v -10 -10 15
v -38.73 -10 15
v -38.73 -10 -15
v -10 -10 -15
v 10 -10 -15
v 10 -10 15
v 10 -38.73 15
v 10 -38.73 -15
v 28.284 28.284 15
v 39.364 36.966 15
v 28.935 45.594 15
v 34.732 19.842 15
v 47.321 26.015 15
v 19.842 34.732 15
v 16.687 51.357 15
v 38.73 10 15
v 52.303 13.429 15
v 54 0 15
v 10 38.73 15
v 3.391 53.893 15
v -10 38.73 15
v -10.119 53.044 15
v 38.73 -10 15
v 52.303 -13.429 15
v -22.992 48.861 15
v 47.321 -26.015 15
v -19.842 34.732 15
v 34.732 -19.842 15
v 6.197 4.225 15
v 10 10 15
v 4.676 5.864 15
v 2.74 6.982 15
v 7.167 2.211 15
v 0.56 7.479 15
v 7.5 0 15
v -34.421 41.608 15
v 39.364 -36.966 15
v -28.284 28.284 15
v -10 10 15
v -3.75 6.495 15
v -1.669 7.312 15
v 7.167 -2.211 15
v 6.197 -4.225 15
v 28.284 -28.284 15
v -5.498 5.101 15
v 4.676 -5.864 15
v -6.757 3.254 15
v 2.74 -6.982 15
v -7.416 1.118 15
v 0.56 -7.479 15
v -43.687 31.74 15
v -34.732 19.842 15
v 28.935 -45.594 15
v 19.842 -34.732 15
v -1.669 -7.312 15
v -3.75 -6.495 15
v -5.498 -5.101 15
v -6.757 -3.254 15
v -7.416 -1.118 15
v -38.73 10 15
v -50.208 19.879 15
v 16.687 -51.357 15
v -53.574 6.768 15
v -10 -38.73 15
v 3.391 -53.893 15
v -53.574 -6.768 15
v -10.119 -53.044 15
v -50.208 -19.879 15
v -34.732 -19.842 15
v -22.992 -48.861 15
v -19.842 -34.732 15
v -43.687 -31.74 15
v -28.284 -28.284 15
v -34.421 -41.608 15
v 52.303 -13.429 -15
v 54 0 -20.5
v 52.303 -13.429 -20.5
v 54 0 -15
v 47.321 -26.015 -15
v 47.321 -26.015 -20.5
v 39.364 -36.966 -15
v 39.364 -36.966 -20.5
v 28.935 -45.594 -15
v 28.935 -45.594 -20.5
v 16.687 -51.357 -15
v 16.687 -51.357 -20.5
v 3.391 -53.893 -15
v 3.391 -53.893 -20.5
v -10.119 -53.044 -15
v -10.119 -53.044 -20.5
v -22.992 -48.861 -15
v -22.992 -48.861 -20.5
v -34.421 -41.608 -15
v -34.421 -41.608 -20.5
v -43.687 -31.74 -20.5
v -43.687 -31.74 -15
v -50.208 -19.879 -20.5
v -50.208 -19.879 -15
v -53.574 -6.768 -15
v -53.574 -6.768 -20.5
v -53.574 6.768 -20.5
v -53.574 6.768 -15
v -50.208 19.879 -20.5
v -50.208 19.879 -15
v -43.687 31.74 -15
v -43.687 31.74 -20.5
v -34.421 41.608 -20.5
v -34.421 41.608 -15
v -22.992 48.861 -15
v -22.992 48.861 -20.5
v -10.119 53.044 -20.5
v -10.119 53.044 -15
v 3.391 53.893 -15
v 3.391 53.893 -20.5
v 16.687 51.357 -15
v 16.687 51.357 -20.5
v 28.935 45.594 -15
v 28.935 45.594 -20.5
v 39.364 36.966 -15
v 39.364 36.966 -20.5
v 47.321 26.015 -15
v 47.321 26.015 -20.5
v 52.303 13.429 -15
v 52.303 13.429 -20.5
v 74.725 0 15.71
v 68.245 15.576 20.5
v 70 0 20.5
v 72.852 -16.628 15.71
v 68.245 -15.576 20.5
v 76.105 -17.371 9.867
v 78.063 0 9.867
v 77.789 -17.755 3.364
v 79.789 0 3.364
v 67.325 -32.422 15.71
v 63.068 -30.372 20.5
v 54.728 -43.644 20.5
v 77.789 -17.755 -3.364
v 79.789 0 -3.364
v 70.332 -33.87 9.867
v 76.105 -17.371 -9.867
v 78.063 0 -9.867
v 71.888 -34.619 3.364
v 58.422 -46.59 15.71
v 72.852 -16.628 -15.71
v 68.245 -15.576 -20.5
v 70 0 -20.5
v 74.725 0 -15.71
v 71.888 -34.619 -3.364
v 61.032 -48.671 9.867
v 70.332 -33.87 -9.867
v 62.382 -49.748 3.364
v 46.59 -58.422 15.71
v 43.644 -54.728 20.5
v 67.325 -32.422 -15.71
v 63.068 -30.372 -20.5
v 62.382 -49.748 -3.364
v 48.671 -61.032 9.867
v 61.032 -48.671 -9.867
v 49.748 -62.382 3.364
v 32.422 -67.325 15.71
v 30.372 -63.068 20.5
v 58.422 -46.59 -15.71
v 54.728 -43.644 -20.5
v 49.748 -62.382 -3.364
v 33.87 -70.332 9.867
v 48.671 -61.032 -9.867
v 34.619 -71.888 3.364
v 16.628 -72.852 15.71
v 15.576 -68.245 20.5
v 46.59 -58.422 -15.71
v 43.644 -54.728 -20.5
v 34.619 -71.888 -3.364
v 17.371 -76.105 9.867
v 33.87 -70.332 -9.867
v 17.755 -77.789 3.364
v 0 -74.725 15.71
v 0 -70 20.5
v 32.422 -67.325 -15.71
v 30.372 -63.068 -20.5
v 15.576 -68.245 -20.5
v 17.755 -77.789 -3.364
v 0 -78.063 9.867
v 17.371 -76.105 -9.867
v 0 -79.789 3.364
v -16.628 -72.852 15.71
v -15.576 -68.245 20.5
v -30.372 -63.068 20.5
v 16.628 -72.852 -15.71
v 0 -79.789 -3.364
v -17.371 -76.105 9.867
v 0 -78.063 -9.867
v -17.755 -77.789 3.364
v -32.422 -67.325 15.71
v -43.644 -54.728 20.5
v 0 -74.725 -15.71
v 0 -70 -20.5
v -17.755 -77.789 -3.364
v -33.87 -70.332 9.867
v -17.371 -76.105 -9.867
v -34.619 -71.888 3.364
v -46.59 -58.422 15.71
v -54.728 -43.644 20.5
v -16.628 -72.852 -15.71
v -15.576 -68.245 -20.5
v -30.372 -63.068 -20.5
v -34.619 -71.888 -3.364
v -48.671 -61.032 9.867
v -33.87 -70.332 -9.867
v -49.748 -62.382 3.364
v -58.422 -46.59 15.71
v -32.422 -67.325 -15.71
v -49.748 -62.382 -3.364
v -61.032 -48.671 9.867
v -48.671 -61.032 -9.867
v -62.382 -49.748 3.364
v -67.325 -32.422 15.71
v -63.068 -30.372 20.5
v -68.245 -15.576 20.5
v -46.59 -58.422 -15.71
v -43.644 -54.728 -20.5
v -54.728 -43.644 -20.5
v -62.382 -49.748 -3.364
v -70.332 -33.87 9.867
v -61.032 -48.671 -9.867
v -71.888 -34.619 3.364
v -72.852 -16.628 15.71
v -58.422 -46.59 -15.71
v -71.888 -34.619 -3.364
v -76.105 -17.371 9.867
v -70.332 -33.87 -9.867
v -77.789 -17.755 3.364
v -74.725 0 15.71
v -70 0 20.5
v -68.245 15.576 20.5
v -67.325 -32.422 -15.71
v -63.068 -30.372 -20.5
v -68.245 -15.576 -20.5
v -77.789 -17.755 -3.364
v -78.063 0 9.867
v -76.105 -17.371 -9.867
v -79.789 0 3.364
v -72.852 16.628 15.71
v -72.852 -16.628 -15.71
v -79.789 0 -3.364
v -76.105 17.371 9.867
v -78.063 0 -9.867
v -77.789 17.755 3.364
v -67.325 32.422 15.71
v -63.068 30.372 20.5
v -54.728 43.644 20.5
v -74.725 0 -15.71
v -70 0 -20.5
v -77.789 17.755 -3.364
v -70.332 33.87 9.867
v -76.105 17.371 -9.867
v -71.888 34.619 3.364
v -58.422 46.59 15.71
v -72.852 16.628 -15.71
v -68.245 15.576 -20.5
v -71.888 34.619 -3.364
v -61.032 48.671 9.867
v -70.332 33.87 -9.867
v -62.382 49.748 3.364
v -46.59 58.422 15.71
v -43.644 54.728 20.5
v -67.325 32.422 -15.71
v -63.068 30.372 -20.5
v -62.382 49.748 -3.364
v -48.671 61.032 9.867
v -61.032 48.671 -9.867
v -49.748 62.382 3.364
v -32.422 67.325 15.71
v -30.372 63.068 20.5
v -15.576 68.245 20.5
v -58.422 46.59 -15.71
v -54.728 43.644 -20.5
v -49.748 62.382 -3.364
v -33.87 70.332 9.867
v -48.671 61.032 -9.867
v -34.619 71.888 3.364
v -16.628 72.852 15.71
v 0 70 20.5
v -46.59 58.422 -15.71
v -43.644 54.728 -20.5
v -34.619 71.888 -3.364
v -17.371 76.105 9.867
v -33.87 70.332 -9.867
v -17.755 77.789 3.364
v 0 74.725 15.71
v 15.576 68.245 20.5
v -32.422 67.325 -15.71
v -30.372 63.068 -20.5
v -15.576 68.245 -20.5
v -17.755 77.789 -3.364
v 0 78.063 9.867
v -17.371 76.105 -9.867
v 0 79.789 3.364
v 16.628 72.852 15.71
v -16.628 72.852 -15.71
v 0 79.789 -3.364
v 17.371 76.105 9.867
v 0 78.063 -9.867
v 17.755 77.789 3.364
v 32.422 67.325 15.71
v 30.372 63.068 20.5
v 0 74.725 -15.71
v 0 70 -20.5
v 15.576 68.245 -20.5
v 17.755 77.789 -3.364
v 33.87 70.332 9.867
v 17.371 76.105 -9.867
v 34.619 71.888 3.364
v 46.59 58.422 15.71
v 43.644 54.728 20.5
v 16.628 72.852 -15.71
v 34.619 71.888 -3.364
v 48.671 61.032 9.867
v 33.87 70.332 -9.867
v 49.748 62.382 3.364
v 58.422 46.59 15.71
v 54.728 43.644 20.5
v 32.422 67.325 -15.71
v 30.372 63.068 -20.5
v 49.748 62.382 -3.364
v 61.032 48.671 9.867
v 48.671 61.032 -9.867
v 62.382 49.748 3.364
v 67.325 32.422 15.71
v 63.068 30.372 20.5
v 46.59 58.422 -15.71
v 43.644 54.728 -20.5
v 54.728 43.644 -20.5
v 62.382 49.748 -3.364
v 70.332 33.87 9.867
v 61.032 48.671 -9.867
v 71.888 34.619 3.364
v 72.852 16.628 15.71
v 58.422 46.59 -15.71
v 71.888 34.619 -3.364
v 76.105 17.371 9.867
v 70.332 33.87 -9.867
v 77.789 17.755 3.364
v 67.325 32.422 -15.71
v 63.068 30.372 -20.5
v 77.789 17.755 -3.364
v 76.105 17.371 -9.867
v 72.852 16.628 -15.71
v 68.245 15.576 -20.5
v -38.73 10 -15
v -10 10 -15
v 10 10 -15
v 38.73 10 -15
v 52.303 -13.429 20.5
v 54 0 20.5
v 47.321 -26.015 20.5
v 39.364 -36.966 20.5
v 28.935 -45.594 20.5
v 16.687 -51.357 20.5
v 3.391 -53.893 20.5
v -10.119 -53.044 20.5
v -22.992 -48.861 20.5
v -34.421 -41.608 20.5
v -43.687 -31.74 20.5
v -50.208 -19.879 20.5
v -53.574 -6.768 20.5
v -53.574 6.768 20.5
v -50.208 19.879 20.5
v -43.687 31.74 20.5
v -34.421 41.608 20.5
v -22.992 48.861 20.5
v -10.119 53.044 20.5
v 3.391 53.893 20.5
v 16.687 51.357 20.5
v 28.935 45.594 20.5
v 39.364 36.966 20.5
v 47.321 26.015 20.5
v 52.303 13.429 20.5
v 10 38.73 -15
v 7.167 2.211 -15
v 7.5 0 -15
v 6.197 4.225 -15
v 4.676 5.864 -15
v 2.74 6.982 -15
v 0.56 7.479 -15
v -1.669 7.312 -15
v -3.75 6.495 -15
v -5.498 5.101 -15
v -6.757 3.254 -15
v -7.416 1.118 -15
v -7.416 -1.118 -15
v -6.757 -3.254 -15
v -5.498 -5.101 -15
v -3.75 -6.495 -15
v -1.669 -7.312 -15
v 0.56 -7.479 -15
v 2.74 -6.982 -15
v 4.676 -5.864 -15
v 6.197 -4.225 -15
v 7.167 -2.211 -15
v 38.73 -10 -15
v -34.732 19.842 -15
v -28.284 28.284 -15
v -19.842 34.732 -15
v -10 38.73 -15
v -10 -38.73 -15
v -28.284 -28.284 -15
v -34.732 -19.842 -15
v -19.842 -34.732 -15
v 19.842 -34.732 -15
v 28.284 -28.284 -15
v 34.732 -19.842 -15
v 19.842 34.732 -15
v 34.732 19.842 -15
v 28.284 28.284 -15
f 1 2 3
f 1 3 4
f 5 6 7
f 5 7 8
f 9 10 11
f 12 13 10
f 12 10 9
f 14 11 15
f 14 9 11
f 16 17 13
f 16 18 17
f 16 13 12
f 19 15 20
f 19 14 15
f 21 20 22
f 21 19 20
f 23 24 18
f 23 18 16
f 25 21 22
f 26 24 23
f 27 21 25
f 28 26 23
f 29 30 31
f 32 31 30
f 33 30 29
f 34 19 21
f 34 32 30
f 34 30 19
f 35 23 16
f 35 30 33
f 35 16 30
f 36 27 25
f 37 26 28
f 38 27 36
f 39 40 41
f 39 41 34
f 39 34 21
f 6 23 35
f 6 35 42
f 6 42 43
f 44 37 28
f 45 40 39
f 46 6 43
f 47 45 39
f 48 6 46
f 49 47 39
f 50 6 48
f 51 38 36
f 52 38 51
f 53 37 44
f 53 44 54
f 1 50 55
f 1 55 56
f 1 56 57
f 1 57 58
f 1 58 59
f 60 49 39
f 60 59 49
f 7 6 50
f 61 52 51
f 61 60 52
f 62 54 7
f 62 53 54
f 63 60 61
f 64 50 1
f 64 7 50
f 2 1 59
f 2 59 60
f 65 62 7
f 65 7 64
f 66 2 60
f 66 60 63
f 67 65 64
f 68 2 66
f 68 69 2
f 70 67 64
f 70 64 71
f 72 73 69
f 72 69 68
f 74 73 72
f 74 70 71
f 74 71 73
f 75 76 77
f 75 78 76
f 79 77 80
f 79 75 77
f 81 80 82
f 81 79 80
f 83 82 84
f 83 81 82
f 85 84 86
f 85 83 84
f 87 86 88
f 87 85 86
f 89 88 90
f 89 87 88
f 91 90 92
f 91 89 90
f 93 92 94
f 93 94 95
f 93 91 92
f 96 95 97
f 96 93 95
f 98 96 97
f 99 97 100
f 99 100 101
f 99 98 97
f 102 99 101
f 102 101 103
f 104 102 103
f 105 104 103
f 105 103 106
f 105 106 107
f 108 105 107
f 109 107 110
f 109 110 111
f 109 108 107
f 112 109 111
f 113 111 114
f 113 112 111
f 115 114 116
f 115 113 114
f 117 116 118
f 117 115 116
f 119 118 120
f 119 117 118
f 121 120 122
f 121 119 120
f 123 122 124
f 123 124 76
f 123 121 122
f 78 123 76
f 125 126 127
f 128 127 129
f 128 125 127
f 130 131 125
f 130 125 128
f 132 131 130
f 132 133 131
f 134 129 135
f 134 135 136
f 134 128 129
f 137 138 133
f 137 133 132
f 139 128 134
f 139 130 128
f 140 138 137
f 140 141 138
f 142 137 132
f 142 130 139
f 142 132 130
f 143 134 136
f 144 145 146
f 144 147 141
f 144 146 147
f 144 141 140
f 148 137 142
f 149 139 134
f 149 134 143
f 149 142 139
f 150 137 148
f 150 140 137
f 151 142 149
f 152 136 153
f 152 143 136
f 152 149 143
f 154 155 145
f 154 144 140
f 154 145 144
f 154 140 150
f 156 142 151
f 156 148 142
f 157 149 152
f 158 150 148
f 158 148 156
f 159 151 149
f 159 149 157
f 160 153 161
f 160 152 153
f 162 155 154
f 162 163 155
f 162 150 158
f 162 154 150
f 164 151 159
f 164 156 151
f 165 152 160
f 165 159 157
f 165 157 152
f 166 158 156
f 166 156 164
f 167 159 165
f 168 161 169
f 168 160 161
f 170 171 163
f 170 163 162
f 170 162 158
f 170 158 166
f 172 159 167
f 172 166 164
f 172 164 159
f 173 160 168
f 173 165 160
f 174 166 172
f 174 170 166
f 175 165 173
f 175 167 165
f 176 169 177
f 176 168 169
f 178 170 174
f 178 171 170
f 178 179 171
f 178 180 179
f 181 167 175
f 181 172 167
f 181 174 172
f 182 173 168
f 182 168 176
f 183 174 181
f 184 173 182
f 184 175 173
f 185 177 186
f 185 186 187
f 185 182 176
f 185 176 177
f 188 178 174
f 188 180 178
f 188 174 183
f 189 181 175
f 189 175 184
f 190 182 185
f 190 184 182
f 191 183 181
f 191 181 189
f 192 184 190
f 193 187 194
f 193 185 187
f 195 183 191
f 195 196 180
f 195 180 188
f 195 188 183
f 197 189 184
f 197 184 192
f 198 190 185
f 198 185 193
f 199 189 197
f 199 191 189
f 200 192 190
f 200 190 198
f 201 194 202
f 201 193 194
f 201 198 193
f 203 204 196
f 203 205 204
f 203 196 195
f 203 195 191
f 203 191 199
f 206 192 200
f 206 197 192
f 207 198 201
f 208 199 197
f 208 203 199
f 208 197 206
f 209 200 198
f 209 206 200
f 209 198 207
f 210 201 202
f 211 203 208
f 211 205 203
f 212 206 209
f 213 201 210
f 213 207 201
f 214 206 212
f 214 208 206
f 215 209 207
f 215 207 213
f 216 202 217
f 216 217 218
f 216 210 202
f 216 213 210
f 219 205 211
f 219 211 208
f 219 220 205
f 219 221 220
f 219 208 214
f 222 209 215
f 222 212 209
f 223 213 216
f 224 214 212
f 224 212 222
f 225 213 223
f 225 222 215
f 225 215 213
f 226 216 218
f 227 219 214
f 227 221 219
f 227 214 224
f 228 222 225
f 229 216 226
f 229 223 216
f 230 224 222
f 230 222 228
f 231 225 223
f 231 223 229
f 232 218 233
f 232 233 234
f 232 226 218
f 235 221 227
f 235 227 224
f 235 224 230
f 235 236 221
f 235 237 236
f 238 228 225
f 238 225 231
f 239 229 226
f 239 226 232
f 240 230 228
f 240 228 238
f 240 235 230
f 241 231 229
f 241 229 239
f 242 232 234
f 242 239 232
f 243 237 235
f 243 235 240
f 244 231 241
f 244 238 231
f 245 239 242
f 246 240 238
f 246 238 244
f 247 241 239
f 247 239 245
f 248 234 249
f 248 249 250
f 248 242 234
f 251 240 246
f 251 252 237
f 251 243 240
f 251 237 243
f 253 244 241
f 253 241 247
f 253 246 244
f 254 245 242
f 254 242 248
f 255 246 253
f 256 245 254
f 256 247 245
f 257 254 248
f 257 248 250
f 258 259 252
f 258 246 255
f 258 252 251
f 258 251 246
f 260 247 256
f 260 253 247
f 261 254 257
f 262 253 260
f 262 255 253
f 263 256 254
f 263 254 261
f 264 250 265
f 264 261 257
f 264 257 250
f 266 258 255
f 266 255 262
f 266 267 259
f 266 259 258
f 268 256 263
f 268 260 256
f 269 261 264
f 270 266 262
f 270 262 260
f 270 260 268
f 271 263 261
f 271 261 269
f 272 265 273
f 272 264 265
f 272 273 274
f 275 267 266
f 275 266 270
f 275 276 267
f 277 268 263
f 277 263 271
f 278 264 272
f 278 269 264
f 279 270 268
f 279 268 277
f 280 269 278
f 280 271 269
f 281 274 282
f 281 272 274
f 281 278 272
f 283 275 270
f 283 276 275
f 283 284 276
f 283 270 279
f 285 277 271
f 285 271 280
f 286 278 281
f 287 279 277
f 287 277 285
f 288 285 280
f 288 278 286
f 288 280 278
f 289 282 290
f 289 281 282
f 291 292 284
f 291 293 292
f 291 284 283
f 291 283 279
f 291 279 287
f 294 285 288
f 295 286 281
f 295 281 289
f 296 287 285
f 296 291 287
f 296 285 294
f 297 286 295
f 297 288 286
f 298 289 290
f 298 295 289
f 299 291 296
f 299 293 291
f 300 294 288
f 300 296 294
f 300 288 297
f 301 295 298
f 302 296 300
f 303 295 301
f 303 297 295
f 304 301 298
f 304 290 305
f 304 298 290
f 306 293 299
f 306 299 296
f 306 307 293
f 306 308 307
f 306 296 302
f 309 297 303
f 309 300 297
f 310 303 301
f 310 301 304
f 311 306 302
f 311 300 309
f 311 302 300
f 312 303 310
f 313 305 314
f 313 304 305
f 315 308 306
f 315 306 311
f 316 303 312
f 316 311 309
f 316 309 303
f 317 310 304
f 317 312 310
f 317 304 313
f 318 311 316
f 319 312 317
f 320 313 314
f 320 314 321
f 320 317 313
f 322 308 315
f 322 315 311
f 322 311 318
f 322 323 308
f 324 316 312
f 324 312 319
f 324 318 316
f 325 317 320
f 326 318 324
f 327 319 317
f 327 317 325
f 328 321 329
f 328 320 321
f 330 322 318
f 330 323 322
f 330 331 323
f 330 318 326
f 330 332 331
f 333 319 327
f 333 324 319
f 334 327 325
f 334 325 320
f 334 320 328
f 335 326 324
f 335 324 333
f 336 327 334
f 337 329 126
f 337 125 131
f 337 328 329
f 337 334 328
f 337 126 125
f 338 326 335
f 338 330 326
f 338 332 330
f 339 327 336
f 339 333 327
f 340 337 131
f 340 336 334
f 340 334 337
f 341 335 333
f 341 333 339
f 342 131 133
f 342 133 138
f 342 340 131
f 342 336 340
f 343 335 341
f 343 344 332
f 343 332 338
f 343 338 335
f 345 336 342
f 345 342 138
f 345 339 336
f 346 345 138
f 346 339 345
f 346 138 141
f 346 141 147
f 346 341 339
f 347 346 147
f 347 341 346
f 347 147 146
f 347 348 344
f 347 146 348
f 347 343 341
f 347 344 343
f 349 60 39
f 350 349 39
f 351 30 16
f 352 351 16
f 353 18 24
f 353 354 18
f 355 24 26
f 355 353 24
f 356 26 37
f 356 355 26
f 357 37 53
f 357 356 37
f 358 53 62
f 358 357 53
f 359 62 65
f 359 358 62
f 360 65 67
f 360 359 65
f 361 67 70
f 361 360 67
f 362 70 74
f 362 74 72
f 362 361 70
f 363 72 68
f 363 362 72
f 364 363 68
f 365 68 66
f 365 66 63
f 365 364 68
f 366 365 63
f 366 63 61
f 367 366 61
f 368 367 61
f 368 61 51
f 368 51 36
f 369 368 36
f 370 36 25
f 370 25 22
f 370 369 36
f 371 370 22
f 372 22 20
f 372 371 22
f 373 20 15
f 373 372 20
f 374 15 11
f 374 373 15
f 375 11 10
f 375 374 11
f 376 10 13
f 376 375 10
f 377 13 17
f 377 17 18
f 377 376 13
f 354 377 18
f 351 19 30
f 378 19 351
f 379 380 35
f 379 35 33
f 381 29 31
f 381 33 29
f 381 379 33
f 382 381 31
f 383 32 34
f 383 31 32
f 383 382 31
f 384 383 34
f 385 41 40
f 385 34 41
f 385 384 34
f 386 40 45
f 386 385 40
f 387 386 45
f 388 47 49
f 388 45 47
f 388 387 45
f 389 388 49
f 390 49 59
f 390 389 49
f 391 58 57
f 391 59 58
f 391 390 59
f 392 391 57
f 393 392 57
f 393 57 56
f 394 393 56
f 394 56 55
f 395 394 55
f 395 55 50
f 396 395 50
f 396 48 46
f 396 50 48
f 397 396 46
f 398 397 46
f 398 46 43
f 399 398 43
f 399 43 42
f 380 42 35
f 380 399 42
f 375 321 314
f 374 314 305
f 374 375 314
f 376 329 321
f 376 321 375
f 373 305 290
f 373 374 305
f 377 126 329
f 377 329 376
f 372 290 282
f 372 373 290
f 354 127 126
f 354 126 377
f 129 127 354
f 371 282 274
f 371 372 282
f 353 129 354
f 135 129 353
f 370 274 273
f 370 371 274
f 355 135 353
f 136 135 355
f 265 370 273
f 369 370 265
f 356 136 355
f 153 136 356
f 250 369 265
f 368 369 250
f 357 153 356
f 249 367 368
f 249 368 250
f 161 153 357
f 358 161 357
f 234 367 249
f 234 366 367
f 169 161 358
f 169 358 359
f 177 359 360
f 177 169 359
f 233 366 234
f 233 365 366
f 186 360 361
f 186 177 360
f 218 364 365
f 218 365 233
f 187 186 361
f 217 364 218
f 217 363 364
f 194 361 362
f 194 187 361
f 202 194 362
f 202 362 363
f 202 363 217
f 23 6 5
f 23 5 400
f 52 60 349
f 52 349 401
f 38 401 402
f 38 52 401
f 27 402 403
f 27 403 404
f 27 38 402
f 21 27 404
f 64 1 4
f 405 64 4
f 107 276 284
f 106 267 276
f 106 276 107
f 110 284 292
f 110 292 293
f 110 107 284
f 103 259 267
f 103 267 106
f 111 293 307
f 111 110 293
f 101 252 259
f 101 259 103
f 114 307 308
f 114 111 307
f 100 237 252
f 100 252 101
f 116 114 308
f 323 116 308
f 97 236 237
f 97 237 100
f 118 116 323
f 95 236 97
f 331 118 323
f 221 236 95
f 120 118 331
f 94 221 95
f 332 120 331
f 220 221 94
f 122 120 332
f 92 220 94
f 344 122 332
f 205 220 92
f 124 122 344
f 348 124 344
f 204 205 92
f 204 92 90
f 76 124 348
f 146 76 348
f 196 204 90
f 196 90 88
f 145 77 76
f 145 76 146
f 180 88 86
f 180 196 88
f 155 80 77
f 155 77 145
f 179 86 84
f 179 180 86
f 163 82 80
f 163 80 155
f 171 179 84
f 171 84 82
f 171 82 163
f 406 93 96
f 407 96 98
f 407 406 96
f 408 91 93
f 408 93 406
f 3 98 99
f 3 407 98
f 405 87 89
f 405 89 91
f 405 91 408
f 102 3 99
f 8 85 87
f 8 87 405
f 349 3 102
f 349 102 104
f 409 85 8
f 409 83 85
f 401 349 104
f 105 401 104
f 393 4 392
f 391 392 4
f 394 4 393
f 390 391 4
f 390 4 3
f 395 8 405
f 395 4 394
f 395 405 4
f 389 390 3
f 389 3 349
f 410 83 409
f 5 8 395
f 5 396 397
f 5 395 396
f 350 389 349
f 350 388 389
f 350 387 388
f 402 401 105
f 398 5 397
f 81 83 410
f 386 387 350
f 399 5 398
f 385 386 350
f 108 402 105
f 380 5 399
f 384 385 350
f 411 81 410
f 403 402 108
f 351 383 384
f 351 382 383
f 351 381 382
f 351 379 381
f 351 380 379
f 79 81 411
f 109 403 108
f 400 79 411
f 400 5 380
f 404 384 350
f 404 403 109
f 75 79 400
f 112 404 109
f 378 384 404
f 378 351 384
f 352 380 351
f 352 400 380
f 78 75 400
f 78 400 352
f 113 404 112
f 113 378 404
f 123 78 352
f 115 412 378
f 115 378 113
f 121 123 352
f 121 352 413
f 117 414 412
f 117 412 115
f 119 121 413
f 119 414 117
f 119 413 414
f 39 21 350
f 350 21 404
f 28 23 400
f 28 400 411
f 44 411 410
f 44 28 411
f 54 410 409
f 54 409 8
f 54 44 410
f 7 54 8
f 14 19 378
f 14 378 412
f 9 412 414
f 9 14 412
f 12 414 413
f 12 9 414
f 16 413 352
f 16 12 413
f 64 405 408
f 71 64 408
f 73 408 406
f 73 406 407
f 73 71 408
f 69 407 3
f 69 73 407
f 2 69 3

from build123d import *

# Parameters (mm, degrees)
SKETCH3_W               = 80
SKETCH3_H               = 30
BOSS_EXTRUDE3_DEPTH     = 10
SKETCH5_W               = 30
SKETCH5_H               = 80
BOSS_EXTRUDE4_DEPTH     = 10
CUT_EXTRUDE1_DEPTH      = 115.990220301
CUT_EXTRUDE1_DEPTH_BACK = 115.990220301
SKETCH7_R               = 7.5


with BuildPart() as part:
    # Sketch1 → Revolve1 (revolve)
    with BuildSketch(Plane(origin=(0, 0, 0), x_dir=(1, 0, 0), z_dir=(0, 1, 0))):
        with BuildLine():
            Line((40, 15), (40, -15))
            Line((40, -15), (54, -15))
            Line((54, -15), (54, -20.5))
            Line((54, -20.5), (70, -20.5))
            ThreePointArc((70, -20.5), (80.007814408, 0), (70, 20.5))
            Line((70, 20.5), (54, 20.5))
            Line((54, 20.5), (54, 15))
            Line((54, 15), (40, 15))
        make_face()
    revolve(axis=Axis((0, 0, 7131.725244947), (0, 0, -1)))

    # Sketch3 → Boss-Extrude3 (add, symmetric)
    with BuildSketch(Plane(origin=(0, 0, 0), x_dir=(1, 0, 0), z_dir=(0, 1, 0))):
        Rectangle(SKETCH3_W, SKETCH3_H)
    extrude(amount=BOSS_EXTRUDE3_DEPTH, both=True)

    # Sketch5 → Boss-Extrude4 (add, symmetric)
    with BuildSketch(Plane(origin=(0, 0, 0), x_dir=(0, 0, -1), z_dir=(1, 0, 0))):
        Rectangle(SKETCH5_W, SKETCH5_H)
    extrude(amount=BOSS_EXTRUDE4_DEPTH, both=True)

    # Sketch7 → Cut-Extrude1 (cut, two sides: drawn at the far end of the back side and taken through both)
    with BuildSketch(Plane.XY.offset(-CUT_EXTRUDE1_DEPTH_BACK)):
        Circle(SKETCH7_R)
    extrude(amount=CUT_EXTRUDE1_DEPTH + CUT_EXTRUDE1_DEPTH_BACK, mode=Mode.SUBTRACT)


solid = part.part
